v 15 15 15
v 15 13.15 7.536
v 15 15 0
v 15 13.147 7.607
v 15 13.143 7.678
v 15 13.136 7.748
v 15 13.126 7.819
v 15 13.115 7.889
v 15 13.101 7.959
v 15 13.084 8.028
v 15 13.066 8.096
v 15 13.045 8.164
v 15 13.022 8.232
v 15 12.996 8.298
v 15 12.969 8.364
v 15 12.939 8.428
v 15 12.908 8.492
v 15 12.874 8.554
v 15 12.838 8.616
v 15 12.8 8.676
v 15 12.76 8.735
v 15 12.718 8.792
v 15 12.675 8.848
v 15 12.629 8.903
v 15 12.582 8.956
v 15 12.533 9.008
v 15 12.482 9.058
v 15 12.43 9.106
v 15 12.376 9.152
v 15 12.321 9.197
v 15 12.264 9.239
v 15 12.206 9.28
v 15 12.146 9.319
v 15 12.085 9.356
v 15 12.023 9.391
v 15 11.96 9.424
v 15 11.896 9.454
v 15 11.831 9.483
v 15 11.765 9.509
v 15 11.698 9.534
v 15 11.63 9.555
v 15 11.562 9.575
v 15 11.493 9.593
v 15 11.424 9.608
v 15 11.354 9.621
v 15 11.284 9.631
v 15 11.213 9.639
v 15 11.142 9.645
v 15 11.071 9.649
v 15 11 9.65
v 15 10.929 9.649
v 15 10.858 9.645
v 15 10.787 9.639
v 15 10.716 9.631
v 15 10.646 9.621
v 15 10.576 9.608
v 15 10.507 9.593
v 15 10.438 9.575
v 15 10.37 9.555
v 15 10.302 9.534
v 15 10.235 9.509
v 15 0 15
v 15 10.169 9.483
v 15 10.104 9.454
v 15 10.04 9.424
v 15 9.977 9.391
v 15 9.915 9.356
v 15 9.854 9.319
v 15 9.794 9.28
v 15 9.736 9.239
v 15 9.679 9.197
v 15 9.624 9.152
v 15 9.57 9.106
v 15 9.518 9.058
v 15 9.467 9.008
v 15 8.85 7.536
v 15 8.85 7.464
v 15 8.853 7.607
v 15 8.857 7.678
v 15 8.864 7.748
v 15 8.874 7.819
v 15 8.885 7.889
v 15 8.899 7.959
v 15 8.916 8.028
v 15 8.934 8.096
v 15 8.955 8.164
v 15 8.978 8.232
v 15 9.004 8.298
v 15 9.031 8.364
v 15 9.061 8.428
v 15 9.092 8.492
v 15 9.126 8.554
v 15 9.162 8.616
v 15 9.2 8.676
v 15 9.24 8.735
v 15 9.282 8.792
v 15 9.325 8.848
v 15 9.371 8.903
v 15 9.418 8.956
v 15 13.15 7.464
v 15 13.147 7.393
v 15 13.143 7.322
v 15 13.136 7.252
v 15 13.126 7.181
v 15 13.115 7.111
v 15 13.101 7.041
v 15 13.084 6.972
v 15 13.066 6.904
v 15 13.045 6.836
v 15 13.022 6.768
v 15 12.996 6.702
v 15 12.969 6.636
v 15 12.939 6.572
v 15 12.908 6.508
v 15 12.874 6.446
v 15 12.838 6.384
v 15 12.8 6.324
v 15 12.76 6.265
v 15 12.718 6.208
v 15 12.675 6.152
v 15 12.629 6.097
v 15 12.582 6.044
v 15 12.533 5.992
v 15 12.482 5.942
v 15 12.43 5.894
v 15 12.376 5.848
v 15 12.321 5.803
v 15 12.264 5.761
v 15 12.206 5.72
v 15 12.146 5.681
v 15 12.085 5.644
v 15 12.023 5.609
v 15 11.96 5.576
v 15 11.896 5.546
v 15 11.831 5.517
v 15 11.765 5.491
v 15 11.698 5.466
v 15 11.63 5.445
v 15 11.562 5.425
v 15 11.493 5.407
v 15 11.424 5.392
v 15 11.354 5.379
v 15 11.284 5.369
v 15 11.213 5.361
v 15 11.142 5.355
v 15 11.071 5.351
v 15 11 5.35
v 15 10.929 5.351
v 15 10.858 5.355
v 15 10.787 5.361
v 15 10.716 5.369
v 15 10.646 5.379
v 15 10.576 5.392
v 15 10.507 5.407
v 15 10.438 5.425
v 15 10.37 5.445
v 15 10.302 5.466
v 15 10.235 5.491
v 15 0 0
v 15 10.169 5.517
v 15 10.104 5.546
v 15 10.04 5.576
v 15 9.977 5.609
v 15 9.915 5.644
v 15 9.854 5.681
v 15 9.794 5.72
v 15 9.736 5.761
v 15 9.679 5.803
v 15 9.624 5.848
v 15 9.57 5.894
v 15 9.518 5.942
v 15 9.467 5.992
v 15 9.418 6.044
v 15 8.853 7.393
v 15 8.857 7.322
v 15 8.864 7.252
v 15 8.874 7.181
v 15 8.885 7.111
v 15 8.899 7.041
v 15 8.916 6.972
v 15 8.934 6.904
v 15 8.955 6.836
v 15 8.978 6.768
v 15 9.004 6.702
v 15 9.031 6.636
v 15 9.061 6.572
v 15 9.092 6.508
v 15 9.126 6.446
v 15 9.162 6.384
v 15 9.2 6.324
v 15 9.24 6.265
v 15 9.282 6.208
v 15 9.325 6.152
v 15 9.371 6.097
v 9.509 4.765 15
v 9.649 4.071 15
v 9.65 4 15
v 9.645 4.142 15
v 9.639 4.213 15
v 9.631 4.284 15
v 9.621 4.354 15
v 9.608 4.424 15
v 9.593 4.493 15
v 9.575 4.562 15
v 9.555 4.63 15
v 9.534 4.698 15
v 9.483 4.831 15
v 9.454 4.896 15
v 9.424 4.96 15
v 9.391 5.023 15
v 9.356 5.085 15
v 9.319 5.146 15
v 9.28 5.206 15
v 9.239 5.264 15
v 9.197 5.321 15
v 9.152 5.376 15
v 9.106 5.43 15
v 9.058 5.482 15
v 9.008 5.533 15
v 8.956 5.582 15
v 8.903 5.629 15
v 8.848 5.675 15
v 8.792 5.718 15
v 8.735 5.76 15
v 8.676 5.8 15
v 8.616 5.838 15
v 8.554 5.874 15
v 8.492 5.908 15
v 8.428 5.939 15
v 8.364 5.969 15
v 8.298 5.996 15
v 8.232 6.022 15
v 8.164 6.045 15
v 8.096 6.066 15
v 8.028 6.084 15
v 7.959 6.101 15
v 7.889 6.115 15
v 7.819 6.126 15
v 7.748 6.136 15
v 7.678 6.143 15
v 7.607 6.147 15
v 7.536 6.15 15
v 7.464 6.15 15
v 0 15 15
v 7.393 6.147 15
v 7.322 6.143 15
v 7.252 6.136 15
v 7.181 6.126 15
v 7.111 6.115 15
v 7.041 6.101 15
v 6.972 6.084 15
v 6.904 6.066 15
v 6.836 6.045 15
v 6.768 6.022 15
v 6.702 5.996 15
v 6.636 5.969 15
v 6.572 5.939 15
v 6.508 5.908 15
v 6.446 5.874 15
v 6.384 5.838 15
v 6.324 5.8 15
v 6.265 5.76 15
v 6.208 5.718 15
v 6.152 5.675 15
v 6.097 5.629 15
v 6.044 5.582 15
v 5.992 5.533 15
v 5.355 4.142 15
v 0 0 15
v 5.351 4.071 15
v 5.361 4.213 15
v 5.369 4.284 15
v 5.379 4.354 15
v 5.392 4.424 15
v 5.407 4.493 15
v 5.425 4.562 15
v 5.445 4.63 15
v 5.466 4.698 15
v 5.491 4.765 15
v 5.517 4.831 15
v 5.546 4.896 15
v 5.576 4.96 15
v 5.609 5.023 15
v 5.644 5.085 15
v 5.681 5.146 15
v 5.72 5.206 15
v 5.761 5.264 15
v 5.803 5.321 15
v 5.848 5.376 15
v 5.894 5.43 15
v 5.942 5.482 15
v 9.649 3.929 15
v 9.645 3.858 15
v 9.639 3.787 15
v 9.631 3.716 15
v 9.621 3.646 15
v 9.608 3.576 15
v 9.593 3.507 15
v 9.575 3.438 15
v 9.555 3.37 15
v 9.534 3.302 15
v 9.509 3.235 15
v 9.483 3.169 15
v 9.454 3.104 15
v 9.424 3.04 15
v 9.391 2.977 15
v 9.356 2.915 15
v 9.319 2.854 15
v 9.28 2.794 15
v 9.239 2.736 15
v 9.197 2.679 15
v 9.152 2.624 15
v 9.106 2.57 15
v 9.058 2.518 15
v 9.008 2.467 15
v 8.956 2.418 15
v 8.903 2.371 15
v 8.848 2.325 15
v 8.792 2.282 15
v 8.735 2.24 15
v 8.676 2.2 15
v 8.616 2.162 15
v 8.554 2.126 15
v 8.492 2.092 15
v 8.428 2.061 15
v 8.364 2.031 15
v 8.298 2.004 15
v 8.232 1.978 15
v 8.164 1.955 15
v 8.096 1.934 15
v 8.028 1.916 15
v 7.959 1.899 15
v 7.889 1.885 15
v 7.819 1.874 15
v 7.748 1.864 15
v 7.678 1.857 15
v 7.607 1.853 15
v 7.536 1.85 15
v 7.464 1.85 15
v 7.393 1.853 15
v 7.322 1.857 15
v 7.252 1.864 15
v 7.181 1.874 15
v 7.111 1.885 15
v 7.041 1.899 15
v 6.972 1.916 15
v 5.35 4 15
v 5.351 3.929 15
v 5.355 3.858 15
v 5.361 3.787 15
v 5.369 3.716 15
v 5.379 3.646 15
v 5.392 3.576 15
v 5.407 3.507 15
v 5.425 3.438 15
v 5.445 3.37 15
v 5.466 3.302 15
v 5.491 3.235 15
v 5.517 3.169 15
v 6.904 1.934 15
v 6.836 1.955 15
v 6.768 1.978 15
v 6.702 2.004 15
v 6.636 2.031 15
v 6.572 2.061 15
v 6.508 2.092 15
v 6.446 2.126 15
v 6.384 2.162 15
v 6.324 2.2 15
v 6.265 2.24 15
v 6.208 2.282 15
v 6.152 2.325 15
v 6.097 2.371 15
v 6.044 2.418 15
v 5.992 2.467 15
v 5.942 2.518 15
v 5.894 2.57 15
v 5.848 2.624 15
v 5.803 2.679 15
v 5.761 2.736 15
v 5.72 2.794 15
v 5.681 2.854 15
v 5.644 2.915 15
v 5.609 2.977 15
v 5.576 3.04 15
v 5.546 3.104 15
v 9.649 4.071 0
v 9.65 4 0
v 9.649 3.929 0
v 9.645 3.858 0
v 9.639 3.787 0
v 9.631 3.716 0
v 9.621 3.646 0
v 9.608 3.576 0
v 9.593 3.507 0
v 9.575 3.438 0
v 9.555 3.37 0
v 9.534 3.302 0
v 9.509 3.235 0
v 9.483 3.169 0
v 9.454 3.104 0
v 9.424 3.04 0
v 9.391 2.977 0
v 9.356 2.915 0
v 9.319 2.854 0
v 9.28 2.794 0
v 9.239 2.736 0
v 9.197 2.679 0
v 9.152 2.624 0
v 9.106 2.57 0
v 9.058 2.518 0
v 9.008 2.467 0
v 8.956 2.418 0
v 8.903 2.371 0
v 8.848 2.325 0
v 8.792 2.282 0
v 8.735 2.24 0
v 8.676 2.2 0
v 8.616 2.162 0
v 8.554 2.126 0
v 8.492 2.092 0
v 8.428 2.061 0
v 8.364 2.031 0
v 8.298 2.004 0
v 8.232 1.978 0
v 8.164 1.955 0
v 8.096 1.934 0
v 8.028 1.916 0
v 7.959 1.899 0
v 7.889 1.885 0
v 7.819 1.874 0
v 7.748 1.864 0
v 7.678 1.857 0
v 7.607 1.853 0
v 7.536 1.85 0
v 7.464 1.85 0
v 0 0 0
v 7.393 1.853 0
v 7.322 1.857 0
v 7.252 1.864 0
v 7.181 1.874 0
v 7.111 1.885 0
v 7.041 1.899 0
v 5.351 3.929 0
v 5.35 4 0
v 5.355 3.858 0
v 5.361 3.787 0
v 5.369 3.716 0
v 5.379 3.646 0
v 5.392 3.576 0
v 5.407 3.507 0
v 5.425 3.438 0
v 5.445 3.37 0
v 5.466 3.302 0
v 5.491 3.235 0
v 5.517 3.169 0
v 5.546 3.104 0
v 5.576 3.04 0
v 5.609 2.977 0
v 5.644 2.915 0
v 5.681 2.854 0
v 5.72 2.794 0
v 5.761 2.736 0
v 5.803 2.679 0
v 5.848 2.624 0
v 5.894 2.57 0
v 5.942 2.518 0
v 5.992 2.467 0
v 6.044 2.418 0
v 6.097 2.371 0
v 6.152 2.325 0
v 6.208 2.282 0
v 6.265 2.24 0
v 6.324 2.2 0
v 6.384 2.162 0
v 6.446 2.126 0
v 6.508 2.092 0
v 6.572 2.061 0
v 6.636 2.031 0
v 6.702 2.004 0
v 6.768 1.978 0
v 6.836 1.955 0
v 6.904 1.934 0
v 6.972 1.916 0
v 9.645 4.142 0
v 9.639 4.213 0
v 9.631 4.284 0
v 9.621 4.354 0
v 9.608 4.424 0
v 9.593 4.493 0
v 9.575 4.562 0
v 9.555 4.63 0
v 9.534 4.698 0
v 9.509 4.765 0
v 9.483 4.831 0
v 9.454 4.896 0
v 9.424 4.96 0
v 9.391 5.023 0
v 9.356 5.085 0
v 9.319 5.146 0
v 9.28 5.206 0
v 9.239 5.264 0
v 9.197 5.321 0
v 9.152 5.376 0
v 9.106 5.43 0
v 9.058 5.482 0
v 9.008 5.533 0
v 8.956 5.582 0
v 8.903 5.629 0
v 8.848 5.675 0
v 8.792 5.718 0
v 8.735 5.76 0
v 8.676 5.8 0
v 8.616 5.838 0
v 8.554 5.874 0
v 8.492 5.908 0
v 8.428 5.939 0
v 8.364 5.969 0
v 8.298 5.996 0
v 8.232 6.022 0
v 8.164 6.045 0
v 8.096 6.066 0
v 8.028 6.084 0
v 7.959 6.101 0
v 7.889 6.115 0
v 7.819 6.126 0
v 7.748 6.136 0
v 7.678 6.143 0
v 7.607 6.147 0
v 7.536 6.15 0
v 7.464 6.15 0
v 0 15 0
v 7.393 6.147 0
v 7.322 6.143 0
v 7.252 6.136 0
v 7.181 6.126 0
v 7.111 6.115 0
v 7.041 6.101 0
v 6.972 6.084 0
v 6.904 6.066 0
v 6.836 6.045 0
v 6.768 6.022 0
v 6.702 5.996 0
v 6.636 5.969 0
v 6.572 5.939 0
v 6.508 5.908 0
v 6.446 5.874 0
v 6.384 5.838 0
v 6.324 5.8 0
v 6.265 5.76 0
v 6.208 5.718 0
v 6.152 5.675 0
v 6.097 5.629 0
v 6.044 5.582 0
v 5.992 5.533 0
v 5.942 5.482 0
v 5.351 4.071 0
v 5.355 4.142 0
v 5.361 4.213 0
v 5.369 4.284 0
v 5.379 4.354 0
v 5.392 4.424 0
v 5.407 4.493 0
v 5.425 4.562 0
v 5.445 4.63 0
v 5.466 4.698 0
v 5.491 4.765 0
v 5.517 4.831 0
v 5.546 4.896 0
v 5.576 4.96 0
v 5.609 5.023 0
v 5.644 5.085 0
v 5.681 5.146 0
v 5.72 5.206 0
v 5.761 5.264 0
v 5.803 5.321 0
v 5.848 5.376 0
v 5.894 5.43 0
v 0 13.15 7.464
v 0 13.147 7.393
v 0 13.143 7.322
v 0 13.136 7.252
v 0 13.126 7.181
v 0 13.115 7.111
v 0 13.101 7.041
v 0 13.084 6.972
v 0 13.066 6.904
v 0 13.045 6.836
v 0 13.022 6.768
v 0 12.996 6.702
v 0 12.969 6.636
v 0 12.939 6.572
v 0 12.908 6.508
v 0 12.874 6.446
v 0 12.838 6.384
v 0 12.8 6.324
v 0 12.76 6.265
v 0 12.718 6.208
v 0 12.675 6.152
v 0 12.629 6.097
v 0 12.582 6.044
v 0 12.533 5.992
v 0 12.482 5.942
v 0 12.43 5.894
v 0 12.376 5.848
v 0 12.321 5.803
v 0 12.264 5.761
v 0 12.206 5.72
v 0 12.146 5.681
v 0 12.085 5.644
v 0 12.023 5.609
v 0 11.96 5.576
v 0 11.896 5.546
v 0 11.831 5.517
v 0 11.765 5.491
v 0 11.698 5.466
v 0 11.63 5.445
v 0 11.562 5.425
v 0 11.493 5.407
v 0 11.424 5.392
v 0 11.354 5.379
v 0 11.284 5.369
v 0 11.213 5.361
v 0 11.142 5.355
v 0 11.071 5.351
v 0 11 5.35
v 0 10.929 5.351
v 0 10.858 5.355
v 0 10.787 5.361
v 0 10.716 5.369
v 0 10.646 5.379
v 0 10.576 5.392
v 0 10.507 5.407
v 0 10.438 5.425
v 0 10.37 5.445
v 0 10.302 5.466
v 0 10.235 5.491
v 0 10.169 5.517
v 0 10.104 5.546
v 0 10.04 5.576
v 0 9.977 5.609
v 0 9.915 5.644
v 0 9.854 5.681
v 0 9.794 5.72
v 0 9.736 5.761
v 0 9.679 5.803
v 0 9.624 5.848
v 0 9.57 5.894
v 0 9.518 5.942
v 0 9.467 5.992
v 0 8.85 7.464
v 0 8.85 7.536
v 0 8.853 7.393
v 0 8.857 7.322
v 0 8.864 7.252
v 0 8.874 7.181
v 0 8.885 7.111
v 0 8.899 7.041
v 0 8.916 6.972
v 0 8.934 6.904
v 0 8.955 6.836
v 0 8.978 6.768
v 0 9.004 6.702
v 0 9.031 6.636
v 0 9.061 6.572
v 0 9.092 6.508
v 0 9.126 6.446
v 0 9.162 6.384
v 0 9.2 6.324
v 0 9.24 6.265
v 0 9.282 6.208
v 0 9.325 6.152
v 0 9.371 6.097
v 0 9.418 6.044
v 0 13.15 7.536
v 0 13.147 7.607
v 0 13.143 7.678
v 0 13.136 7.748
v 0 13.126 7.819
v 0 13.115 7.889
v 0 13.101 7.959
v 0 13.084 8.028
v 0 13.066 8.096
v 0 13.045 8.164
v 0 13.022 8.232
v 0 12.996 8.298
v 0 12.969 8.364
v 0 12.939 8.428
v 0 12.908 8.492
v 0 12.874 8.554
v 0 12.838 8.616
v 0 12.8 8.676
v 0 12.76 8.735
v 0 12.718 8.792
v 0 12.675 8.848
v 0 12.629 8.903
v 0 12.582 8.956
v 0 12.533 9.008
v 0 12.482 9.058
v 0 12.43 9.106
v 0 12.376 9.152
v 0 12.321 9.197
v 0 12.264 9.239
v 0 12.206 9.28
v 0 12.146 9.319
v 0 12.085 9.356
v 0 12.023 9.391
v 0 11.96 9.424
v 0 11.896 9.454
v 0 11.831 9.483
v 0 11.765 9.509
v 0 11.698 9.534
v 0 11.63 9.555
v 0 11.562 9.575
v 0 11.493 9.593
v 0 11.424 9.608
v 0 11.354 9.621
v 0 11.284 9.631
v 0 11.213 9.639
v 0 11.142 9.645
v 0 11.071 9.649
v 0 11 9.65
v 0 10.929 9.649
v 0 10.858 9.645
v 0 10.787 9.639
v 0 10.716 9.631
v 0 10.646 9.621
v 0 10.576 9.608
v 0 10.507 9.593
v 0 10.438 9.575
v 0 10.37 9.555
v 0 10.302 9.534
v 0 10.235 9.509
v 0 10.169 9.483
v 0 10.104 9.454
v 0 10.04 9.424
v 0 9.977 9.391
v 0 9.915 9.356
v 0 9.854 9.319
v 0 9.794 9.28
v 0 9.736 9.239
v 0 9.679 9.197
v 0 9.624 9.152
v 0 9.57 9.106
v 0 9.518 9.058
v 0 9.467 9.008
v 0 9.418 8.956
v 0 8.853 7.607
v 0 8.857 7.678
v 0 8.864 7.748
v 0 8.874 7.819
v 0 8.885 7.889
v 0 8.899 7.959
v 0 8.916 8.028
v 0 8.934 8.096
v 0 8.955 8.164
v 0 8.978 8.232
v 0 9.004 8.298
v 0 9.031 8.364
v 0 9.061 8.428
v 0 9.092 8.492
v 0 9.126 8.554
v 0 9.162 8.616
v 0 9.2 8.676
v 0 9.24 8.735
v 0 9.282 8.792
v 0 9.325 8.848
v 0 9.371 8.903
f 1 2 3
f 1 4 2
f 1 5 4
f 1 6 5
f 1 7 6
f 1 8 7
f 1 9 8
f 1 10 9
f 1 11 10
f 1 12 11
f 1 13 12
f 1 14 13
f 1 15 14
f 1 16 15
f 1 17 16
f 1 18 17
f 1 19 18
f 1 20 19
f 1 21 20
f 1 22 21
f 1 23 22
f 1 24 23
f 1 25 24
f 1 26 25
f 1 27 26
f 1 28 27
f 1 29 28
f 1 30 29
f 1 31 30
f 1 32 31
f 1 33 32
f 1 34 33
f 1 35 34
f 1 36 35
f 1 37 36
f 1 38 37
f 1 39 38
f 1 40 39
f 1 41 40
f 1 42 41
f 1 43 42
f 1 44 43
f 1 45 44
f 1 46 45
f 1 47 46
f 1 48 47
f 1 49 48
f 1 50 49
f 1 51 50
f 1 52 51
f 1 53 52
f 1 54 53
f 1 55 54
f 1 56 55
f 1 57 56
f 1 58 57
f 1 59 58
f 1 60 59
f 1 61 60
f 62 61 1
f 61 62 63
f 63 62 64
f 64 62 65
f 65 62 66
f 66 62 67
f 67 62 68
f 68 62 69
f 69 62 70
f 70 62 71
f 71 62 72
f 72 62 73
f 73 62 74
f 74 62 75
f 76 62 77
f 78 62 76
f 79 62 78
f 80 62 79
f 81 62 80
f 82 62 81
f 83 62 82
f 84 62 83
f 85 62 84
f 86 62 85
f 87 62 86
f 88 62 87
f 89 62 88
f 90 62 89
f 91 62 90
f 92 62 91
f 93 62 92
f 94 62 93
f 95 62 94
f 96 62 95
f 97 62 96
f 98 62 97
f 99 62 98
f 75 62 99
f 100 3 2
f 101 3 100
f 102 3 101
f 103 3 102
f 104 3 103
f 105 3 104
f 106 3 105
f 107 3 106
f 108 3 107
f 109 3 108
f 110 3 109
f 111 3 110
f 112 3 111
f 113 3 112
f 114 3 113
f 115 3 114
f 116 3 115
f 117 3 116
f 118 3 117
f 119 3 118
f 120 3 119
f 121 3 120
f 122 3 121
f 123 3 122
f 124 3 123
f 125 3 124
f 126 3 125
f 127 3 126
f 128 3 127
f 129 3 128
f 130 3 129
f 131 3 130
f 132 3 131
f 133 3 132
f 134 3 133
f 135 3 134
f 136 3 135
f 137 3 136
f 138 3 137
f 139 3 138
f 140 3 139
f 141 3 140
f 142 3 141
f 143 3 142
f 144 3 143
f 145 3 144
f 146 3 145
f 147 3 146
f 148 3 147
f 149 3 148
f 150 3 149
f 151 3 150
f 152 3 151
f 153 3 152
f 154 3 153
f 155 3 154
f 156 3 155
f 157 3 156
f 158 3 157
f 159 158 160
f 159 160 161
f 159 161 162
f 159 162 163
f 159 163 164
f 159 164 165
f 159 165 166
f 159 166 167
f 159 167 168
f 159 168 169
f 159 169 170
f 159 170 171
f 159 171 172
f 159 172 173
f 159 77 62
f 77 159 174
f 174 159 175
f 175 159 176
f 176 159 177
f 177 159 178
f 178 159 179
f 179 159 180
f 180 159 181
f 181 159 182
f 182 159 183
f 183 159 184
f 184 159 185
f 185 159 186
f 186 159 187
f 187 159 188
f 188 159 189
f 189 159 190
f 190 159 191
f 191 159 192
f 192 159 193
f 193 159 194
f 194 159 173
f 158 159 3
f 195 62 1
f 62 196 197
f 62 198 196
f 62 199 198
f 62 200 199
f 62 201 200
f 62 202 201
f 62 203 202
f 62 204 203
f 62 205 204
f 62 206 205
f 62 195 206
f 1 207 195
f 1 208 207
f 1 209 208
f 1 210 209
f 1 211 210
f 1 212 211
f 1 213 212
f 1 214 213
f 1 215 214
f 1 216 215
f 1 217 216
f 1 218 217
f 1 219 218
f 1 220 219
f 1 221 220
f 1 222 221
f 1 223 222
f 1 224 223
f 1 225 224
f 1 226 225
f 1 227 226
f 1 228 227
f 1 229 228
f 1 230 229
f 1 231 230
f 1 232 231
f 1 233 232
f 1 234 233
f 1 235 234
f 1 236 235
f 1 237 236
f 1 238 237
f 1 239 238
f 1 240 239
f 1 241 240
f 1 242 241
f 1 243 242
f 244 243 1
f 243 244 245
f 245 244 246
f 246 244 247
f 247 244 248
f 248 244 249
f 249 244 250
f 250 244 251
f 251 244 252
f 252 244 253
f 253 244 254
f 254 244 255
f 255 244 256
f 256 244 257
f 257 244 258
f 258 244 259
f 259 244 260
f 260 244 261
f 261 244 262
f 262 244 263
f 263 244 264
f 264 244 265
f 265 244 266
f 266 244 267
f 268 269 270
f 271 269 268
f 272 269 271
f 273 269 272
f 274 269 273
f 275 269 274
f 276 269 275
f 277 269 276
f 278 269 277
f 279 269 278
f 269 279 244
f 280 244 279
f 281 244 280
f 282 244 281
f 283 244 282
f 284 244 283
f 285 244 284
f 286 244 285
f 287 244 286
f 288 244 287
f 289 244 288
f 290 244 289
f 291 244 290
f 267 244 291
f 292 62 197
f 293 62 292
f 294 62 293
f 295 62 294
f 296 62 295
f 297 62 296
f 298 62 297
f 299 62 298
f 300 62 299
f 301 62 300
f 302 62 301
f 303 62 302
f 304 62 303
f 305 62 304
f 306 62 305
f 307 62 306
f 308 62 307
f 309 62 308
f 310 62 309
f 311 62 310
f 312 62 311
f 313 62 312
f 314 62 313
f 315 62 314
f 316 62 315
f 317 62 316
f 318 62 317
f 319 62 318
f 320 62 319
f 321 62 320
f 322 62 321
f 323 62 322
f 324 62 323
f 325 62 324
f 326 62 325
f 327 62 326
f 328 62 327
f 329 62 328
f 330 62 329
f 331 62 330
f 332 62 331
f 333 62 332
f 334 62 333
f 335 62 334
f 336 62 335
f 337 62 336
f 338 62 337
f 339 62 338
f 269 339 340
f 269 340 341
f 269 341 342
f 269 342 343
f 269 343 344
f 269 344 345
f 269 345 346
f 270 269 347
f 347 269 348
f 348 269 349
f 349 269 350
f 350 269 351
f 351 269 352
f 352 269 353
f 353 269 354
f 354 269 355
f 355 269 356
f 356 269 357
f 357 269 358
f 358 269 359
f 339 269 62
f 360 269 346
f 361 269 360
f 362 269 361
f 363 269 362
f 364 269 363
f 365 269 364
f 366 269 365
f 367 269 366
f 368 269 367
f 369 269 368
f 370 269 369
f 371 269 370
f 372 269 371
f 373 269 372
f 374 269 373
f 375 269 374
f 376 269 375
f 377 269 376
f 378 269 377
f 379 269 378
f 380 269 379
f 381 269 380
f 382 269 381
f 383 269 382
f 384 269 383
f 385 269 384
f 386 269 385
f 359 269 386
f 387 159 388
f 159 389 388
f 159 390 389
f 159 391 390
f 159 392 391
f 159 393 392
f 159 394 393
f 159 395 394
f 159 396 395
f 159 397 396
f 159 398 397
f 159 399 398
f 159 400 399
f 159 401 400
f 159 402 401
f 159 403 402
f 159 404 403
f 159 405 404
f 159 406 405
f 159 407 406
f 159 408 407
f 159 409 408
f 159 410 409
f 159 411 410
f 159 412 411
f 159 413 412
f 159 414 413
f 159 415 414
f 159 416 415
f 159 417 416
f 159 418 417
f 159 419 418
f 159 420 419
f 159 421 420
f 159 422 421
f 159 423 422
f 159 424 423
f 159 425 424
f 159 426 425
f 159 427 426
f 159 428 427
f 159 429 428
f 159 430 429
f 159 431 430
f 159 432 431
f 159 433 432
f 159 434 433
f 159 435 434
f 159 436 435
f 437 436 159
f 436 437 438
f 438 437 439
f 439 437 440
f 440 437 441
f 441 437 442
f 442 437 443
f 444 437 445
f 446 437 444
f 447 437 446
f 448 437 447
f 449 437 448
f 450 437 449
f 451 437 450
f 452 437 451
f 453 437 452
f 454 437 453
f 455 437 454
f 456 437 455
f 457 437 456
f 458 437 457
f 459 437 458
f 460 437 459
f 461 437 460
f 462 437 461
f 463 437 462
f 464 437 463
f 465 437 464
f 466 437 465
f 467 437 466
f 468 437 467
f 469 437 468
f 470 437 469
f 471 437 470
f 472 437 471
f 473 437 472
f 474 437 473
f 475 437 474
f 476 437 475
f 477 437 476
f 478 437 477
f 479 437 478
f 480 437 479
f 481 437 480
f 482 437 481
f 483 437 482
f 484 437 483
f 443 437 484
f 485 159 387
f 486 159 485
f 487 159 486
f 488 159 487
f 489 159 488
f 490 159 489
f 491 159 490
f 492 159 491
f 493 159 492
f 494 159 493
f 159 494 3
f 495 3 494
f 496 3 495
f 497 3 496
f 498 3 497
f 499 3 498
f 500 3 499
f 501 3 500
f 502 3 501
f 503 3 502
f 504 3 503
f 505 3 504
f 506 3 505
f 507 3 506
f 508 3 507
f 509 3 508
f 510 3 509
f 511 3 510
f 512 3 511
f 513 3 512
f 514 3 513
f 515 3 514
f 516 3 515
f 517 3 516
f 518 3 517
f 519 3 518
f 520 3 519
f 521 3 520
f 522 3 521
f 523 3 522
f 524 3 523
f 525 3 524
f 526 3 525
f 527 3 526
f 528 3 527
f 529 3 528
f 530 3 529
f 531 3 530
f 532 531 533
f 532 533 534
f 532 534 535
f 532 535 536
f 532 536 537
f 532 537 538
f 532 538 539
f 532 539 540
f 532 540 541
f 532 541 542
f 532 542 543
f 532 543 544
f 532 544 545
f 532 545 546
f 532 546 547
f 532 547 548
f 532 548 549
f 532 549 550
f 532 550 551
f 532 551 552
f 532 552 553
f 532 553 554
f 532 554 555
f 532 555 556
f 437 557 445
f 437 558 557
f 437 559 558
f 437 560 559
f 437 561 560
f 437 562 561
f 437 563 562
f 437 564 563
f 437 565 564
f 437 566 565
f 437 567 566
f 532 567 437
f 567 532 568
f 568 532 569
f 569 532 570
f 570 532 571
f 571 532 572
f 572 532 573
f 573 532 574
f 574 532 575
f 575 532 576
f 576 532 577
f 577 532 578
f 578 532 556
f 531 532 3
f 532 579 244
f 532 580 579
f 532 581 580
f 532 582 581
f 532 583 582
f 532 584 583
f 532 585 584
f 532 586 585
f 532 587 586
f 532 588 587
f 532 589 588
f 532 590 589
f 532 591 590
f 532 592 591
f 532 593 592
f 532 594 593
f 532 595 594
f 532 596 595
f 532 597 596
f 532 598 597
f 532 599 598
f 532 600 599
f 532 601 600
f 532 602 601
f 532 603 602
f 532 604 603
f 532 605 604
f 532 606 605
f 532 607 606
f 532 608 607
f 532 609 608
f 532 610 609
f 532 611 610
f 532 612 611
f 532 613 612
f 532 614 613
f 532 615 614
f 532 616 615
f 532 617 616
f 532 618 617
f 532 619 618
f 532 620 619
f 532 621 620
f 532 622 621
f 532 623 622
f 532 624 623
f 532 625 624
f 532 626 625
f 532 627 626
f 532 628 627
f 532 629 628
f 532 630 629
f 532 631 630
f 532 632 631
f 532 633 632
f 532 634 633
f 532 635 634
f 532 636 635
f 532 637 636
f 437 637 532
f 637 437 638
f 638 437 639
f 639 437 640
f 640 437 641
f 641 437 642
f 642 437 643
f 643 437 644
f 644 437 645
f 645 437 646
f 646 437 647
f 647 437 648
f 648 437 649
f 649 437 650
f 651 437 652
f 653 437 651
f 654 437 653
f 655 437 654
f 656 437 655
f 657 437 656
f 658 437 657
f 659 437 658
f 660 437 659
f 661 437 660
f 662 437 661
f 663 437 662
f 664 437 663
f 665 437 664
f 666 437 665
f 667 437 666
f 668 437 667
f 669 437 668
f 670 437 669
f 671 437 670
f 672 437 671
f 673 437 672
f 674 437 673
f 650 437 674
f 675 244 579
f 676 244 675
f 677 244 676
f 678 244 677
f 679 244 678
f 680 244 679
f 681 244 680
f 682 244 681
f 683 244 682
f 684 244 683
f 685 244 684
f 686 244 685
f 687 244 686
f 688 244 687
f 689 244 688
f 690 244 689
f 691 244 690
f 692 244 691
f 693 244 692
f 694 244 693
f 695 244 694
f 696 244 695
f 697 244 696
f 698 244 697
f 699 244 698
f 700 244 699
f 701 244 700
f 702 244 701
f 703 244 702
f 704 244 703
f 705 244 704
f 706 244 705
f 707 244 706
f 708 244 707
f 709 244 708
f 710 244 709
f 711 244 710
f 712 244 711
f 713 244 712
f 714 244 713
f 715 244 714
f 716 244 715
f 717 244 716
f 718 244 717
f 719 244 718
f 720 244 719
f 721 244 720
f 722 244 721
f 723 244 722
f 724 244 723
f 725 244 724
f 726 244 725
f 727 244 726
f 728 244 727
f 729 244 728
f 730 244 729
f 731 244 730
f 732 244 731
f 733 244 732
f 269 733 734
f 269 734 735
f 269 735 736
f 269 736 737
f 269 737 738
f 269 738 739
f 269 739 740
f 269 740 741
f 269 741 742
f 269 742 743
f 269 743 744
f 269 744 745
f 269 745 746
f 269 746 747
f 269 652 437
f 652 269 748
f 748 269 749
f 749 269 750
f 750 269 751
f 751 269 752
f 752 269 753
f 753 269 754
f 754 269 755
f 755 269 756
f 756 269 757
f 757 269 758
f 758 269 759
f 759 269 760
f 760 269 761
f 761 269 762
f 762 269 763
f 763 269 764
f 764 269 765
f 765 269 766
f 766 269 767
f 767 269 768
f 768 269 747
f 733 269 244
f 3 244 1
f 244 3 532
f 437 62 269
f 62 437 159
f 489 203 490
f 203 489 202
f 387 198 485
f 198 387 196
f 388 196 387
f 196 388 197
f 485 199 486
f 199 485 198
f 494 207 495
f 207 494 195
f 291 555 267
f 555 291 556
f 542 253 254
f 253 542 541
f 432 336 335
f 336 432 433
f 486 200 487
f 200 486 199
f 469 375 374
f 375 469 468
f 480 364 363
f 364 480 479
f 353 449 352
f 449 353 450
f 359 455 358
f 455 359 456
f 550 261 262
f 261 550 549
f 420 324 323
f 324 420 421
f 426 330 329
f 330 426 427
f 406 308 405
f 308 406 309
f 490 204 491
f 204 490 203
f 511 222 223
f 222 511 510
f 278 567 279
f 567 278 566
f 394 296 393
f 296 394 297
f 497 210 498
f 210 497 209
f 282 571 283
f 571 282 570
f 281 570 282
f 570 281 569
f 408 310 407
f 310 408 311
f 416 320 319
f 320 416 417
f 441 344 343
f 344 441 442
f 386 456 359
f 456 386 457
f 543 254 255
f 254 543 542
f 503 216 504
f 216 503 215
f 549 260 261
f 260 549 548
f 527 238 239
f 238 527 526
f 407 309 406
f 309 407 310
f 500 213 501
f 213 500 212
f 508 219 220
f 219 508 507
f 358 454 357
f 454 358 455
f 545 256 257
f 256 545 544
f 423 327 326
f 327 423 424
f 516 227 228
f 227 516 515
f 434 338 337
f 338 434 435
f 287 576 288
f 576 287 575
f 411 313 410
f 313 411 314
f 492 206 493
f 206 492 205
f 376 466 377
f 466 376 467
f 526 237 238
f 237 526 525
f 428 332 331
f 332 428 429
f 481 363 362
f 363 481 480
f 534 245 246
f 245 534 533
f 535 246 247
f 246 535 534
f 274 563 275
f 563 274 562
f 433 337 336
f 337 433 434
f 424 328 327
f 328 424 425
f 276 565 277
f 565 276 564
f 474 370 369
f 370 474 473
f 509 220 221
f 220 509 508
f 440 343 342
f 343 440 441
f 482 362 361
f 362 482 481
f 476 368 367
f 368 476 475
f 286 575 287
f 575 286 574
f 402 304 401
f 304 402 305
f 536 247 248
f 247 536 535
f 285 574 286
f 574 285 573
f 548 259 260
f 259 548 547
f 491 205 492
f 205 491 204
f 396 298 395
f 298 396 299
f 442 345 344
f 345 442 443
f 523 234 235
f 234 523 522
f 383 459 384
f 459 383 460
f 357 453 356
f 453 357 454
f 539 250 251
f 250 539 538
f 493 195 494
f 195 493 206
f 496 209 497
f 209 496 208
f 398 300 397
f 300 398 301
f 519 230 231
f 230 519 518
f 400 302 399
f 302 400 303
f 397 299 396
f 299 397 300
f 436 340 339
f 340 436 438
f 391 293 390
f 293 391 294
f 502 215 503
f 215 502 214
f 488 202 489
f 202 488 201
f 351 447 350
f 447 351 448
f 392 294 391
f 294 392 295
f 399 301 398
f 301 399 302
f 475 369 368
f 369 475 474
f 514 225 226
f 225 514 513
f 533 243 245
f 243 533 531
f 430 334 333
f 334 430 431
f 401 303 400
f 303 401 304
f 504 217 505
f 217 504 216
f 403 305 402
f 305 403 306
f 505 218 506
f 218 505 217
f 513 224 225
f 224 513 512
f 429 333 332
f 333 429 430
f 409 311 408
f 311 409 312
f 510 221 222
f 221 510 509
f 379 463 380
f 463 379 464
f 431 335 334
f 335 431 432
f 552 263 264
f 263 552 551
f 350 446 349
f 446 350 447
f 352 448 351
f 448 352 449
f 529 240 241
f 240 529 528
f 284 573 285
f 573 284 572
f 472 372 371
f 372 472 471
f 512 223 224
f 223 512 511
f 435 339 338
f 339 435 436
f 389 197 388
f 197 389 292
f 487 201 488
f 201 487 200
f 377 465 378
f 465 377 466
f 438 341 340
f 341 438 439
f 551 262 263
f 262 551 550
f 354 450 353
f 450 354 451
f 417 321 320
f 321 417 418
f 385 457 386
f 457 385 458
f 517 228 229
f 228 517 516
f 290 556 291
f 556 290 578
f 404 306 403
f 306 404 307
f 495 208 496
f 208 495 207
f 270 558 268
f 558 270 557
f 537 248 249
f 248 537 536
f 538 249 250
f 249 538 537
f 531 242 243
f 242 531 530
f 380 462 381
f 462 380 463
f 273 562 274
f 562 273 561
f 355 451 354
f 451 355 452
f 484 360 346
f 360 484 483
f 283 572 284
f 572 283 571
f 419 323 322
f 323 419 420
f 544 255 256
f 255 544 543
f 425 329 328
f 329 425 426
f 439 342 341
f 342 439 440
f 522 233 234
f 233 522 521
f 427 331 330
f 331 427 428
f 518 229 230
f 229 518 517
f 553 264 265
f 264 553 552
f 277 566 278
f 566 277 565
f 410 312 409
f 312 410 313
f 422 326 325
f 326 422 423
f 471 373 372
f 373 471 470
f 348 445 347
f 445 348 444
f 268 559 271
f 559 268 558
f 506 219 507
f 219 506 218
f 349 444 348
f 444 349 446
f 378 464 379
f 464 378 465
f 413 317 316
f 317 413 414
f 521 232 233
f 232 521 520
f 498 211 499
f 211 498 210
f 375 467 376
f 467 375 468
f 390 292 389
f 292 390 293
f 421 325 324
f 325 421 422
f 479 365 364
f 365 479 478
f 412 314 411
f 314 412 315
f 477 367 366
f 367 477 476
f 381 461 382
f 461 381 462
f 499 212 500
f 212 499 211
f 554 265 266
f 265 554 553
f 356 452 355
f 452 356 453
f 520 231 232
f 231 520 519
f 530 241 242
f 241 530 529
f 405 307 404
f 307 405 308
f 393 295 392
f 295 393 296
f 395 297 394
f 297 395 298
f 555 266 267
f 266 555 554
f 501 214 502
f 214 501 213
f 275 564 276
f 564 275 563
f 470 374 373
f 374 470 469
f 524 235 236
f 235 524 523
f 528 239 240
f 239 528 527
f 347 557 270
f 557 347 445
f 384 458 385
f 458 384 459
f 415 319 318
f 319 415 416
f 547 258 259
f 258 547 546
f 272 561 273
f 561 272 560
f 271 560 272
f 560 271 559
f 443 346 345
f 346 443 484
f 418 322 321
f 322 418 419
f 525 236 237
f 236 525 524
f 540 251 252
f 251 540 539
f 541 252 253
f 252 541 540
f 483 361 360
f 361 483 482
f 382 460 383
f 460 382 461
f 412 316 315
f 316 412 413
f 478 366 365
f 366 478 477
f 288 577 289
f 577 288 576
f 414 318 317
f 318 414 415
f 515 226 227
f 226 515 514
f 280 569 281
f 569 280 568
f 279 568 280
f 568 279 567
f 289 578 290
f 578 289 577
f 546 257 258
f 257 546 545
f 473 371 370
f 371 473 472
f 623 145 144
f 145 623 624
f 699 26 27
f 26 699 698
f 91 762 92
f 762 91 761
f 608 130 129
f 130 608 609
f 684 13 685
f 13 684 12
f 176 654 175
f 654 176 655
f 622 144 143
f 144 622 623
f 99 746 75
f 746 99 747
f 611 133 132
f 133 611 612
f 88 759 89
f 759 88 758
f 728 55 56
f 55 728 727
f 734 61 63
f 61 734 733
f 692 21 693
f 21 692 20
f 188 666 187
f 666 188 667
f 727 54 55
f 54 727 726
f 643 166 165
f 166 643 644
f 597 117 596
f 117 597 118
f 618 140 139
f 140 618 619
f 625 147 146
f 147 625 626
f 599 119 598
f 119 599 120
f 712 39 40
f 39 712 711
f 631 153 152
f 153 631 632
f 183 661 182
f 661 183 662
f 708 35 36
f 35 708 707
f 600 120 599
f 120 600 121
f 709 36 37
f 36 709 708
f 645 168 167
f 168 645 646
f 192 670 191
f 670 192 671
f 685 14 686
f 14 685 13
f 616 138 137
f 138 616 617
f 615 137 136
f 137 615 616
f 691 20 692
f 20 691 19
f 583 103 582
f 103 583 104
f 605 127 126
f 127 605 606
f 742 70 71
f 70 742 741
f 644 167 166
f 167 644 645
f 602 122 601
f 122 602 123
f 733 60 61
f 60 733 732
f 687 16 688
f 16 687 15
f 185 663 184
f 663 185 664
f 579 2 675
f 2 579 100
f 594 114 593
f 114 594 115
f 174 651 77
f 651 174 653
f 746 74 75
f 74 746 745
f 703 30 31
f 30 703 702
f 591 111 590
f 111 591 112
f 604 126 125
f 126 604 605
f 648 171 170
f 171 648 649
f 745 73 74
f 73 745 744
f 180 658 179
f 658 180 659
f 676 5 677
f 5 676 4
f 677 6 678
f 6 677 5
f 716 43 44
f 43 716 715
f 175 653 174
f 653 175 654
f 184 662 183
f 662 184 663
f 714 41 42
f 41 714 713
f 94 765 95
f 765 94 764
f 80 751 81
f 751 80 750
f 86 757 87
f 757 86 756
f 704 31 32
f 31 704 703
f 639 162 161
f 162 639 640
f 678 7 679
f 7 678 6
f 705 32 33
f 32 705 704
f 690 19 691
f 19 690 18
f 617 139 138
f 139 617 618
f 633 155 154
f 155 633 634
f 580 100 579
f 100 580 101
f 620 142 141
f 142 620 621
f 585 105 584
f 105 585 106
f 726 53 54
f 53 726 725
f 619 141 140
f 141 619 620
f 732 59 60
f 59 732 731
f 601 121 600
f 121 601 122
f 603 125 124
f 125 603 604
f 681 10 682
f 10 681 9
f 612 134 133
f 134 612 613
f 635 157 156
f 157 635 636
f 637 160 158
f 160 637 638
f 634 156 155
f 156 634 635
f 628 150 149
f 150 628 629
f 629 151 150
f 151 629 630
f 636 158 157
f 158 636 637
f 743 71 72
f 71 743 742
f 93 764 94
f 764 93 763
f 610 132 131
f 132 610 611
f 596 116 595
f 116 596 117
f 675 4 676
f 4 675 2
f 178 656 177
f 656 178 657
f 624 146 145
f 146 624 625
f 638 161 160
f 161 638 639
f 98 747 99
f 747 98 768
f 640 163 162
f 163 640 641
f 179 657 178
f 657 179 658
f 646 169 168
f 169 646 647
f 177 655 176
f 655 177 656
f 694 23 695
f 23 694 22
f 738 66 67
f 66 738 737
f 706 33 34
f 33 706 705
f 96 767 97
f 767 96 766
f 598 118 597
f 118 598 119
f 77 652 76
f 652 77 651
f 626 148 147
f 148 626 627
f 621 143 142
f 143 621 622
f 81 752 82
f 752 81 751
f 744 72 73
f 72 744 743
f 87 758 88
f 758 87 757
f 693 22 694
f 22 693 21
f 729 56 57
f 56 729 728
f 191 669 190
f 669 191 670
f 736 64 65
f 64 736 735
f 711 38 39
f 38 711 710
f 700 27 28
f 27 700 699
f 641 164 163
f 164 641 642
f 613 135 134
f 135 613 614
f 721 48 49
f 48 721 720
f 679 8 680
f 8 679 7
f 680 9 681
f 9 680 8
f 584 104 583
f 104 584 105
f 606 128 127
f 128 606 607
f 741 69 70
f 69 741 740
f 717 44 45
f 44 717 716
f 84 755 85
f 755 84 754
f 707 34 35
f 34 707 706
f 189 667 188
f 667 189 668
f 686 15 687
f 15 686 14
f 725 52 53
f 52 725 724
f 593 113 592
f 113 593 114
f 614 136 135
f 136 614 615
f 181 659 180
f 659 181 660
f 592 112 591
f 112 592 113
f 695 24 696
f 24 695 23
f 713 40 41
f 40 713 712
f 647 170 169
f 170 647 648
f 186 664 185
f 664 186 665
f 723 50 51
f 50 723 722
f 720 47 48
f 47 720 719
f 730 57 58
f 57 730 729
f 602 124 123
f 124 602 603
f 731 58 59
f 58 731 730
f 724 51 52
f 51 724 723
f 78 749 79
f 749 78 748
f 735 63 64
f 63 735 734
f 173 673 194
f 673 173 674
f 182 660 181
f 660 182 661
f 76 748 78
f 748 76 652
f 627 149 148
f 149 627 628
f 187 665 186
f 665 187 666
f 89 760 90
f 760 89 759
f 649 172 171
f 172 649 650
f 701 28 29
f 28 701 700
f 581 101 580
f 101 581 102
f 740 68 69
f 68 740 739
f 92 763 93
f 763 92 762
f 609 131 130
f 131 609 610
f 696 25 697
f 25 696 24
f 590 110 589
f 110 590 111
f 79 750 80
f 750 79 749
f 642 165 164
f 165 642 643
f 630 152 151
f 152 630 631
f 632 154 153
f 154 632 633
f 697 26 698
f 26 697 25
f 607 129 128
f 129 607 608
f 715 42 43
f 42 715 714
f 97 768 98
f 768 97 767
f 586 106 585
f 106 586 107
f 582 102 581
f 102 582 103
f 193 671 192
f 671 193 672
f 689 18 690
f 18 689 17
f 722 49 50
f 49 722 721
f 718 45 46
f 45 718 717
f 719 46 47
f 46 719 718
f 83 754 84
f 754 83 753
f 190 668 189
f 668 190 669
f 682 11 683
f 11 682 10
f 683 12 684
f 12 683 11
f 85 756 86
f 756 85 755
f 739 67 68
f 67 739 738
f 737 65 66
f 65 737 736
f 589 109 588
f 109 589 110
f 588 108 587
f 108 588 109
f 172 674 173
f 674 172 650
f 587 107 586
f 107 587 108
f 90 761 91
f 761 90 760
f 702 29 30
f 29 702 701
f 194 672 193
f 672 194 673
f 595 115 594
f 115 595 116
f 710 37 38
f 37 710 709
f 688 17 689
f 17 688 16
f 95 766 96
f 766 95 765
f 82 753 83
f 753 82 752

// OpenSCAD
$fn = 190;

difference() {
    cube([15, 15, 15]);
    
    translate([7.5, 4, -1]) cylinder(d=4.3, h=100);
    
    translate([-1, 11, 7.5]) rotate([0, 90, 0])cylinder(d=4.3, h=100);
}
